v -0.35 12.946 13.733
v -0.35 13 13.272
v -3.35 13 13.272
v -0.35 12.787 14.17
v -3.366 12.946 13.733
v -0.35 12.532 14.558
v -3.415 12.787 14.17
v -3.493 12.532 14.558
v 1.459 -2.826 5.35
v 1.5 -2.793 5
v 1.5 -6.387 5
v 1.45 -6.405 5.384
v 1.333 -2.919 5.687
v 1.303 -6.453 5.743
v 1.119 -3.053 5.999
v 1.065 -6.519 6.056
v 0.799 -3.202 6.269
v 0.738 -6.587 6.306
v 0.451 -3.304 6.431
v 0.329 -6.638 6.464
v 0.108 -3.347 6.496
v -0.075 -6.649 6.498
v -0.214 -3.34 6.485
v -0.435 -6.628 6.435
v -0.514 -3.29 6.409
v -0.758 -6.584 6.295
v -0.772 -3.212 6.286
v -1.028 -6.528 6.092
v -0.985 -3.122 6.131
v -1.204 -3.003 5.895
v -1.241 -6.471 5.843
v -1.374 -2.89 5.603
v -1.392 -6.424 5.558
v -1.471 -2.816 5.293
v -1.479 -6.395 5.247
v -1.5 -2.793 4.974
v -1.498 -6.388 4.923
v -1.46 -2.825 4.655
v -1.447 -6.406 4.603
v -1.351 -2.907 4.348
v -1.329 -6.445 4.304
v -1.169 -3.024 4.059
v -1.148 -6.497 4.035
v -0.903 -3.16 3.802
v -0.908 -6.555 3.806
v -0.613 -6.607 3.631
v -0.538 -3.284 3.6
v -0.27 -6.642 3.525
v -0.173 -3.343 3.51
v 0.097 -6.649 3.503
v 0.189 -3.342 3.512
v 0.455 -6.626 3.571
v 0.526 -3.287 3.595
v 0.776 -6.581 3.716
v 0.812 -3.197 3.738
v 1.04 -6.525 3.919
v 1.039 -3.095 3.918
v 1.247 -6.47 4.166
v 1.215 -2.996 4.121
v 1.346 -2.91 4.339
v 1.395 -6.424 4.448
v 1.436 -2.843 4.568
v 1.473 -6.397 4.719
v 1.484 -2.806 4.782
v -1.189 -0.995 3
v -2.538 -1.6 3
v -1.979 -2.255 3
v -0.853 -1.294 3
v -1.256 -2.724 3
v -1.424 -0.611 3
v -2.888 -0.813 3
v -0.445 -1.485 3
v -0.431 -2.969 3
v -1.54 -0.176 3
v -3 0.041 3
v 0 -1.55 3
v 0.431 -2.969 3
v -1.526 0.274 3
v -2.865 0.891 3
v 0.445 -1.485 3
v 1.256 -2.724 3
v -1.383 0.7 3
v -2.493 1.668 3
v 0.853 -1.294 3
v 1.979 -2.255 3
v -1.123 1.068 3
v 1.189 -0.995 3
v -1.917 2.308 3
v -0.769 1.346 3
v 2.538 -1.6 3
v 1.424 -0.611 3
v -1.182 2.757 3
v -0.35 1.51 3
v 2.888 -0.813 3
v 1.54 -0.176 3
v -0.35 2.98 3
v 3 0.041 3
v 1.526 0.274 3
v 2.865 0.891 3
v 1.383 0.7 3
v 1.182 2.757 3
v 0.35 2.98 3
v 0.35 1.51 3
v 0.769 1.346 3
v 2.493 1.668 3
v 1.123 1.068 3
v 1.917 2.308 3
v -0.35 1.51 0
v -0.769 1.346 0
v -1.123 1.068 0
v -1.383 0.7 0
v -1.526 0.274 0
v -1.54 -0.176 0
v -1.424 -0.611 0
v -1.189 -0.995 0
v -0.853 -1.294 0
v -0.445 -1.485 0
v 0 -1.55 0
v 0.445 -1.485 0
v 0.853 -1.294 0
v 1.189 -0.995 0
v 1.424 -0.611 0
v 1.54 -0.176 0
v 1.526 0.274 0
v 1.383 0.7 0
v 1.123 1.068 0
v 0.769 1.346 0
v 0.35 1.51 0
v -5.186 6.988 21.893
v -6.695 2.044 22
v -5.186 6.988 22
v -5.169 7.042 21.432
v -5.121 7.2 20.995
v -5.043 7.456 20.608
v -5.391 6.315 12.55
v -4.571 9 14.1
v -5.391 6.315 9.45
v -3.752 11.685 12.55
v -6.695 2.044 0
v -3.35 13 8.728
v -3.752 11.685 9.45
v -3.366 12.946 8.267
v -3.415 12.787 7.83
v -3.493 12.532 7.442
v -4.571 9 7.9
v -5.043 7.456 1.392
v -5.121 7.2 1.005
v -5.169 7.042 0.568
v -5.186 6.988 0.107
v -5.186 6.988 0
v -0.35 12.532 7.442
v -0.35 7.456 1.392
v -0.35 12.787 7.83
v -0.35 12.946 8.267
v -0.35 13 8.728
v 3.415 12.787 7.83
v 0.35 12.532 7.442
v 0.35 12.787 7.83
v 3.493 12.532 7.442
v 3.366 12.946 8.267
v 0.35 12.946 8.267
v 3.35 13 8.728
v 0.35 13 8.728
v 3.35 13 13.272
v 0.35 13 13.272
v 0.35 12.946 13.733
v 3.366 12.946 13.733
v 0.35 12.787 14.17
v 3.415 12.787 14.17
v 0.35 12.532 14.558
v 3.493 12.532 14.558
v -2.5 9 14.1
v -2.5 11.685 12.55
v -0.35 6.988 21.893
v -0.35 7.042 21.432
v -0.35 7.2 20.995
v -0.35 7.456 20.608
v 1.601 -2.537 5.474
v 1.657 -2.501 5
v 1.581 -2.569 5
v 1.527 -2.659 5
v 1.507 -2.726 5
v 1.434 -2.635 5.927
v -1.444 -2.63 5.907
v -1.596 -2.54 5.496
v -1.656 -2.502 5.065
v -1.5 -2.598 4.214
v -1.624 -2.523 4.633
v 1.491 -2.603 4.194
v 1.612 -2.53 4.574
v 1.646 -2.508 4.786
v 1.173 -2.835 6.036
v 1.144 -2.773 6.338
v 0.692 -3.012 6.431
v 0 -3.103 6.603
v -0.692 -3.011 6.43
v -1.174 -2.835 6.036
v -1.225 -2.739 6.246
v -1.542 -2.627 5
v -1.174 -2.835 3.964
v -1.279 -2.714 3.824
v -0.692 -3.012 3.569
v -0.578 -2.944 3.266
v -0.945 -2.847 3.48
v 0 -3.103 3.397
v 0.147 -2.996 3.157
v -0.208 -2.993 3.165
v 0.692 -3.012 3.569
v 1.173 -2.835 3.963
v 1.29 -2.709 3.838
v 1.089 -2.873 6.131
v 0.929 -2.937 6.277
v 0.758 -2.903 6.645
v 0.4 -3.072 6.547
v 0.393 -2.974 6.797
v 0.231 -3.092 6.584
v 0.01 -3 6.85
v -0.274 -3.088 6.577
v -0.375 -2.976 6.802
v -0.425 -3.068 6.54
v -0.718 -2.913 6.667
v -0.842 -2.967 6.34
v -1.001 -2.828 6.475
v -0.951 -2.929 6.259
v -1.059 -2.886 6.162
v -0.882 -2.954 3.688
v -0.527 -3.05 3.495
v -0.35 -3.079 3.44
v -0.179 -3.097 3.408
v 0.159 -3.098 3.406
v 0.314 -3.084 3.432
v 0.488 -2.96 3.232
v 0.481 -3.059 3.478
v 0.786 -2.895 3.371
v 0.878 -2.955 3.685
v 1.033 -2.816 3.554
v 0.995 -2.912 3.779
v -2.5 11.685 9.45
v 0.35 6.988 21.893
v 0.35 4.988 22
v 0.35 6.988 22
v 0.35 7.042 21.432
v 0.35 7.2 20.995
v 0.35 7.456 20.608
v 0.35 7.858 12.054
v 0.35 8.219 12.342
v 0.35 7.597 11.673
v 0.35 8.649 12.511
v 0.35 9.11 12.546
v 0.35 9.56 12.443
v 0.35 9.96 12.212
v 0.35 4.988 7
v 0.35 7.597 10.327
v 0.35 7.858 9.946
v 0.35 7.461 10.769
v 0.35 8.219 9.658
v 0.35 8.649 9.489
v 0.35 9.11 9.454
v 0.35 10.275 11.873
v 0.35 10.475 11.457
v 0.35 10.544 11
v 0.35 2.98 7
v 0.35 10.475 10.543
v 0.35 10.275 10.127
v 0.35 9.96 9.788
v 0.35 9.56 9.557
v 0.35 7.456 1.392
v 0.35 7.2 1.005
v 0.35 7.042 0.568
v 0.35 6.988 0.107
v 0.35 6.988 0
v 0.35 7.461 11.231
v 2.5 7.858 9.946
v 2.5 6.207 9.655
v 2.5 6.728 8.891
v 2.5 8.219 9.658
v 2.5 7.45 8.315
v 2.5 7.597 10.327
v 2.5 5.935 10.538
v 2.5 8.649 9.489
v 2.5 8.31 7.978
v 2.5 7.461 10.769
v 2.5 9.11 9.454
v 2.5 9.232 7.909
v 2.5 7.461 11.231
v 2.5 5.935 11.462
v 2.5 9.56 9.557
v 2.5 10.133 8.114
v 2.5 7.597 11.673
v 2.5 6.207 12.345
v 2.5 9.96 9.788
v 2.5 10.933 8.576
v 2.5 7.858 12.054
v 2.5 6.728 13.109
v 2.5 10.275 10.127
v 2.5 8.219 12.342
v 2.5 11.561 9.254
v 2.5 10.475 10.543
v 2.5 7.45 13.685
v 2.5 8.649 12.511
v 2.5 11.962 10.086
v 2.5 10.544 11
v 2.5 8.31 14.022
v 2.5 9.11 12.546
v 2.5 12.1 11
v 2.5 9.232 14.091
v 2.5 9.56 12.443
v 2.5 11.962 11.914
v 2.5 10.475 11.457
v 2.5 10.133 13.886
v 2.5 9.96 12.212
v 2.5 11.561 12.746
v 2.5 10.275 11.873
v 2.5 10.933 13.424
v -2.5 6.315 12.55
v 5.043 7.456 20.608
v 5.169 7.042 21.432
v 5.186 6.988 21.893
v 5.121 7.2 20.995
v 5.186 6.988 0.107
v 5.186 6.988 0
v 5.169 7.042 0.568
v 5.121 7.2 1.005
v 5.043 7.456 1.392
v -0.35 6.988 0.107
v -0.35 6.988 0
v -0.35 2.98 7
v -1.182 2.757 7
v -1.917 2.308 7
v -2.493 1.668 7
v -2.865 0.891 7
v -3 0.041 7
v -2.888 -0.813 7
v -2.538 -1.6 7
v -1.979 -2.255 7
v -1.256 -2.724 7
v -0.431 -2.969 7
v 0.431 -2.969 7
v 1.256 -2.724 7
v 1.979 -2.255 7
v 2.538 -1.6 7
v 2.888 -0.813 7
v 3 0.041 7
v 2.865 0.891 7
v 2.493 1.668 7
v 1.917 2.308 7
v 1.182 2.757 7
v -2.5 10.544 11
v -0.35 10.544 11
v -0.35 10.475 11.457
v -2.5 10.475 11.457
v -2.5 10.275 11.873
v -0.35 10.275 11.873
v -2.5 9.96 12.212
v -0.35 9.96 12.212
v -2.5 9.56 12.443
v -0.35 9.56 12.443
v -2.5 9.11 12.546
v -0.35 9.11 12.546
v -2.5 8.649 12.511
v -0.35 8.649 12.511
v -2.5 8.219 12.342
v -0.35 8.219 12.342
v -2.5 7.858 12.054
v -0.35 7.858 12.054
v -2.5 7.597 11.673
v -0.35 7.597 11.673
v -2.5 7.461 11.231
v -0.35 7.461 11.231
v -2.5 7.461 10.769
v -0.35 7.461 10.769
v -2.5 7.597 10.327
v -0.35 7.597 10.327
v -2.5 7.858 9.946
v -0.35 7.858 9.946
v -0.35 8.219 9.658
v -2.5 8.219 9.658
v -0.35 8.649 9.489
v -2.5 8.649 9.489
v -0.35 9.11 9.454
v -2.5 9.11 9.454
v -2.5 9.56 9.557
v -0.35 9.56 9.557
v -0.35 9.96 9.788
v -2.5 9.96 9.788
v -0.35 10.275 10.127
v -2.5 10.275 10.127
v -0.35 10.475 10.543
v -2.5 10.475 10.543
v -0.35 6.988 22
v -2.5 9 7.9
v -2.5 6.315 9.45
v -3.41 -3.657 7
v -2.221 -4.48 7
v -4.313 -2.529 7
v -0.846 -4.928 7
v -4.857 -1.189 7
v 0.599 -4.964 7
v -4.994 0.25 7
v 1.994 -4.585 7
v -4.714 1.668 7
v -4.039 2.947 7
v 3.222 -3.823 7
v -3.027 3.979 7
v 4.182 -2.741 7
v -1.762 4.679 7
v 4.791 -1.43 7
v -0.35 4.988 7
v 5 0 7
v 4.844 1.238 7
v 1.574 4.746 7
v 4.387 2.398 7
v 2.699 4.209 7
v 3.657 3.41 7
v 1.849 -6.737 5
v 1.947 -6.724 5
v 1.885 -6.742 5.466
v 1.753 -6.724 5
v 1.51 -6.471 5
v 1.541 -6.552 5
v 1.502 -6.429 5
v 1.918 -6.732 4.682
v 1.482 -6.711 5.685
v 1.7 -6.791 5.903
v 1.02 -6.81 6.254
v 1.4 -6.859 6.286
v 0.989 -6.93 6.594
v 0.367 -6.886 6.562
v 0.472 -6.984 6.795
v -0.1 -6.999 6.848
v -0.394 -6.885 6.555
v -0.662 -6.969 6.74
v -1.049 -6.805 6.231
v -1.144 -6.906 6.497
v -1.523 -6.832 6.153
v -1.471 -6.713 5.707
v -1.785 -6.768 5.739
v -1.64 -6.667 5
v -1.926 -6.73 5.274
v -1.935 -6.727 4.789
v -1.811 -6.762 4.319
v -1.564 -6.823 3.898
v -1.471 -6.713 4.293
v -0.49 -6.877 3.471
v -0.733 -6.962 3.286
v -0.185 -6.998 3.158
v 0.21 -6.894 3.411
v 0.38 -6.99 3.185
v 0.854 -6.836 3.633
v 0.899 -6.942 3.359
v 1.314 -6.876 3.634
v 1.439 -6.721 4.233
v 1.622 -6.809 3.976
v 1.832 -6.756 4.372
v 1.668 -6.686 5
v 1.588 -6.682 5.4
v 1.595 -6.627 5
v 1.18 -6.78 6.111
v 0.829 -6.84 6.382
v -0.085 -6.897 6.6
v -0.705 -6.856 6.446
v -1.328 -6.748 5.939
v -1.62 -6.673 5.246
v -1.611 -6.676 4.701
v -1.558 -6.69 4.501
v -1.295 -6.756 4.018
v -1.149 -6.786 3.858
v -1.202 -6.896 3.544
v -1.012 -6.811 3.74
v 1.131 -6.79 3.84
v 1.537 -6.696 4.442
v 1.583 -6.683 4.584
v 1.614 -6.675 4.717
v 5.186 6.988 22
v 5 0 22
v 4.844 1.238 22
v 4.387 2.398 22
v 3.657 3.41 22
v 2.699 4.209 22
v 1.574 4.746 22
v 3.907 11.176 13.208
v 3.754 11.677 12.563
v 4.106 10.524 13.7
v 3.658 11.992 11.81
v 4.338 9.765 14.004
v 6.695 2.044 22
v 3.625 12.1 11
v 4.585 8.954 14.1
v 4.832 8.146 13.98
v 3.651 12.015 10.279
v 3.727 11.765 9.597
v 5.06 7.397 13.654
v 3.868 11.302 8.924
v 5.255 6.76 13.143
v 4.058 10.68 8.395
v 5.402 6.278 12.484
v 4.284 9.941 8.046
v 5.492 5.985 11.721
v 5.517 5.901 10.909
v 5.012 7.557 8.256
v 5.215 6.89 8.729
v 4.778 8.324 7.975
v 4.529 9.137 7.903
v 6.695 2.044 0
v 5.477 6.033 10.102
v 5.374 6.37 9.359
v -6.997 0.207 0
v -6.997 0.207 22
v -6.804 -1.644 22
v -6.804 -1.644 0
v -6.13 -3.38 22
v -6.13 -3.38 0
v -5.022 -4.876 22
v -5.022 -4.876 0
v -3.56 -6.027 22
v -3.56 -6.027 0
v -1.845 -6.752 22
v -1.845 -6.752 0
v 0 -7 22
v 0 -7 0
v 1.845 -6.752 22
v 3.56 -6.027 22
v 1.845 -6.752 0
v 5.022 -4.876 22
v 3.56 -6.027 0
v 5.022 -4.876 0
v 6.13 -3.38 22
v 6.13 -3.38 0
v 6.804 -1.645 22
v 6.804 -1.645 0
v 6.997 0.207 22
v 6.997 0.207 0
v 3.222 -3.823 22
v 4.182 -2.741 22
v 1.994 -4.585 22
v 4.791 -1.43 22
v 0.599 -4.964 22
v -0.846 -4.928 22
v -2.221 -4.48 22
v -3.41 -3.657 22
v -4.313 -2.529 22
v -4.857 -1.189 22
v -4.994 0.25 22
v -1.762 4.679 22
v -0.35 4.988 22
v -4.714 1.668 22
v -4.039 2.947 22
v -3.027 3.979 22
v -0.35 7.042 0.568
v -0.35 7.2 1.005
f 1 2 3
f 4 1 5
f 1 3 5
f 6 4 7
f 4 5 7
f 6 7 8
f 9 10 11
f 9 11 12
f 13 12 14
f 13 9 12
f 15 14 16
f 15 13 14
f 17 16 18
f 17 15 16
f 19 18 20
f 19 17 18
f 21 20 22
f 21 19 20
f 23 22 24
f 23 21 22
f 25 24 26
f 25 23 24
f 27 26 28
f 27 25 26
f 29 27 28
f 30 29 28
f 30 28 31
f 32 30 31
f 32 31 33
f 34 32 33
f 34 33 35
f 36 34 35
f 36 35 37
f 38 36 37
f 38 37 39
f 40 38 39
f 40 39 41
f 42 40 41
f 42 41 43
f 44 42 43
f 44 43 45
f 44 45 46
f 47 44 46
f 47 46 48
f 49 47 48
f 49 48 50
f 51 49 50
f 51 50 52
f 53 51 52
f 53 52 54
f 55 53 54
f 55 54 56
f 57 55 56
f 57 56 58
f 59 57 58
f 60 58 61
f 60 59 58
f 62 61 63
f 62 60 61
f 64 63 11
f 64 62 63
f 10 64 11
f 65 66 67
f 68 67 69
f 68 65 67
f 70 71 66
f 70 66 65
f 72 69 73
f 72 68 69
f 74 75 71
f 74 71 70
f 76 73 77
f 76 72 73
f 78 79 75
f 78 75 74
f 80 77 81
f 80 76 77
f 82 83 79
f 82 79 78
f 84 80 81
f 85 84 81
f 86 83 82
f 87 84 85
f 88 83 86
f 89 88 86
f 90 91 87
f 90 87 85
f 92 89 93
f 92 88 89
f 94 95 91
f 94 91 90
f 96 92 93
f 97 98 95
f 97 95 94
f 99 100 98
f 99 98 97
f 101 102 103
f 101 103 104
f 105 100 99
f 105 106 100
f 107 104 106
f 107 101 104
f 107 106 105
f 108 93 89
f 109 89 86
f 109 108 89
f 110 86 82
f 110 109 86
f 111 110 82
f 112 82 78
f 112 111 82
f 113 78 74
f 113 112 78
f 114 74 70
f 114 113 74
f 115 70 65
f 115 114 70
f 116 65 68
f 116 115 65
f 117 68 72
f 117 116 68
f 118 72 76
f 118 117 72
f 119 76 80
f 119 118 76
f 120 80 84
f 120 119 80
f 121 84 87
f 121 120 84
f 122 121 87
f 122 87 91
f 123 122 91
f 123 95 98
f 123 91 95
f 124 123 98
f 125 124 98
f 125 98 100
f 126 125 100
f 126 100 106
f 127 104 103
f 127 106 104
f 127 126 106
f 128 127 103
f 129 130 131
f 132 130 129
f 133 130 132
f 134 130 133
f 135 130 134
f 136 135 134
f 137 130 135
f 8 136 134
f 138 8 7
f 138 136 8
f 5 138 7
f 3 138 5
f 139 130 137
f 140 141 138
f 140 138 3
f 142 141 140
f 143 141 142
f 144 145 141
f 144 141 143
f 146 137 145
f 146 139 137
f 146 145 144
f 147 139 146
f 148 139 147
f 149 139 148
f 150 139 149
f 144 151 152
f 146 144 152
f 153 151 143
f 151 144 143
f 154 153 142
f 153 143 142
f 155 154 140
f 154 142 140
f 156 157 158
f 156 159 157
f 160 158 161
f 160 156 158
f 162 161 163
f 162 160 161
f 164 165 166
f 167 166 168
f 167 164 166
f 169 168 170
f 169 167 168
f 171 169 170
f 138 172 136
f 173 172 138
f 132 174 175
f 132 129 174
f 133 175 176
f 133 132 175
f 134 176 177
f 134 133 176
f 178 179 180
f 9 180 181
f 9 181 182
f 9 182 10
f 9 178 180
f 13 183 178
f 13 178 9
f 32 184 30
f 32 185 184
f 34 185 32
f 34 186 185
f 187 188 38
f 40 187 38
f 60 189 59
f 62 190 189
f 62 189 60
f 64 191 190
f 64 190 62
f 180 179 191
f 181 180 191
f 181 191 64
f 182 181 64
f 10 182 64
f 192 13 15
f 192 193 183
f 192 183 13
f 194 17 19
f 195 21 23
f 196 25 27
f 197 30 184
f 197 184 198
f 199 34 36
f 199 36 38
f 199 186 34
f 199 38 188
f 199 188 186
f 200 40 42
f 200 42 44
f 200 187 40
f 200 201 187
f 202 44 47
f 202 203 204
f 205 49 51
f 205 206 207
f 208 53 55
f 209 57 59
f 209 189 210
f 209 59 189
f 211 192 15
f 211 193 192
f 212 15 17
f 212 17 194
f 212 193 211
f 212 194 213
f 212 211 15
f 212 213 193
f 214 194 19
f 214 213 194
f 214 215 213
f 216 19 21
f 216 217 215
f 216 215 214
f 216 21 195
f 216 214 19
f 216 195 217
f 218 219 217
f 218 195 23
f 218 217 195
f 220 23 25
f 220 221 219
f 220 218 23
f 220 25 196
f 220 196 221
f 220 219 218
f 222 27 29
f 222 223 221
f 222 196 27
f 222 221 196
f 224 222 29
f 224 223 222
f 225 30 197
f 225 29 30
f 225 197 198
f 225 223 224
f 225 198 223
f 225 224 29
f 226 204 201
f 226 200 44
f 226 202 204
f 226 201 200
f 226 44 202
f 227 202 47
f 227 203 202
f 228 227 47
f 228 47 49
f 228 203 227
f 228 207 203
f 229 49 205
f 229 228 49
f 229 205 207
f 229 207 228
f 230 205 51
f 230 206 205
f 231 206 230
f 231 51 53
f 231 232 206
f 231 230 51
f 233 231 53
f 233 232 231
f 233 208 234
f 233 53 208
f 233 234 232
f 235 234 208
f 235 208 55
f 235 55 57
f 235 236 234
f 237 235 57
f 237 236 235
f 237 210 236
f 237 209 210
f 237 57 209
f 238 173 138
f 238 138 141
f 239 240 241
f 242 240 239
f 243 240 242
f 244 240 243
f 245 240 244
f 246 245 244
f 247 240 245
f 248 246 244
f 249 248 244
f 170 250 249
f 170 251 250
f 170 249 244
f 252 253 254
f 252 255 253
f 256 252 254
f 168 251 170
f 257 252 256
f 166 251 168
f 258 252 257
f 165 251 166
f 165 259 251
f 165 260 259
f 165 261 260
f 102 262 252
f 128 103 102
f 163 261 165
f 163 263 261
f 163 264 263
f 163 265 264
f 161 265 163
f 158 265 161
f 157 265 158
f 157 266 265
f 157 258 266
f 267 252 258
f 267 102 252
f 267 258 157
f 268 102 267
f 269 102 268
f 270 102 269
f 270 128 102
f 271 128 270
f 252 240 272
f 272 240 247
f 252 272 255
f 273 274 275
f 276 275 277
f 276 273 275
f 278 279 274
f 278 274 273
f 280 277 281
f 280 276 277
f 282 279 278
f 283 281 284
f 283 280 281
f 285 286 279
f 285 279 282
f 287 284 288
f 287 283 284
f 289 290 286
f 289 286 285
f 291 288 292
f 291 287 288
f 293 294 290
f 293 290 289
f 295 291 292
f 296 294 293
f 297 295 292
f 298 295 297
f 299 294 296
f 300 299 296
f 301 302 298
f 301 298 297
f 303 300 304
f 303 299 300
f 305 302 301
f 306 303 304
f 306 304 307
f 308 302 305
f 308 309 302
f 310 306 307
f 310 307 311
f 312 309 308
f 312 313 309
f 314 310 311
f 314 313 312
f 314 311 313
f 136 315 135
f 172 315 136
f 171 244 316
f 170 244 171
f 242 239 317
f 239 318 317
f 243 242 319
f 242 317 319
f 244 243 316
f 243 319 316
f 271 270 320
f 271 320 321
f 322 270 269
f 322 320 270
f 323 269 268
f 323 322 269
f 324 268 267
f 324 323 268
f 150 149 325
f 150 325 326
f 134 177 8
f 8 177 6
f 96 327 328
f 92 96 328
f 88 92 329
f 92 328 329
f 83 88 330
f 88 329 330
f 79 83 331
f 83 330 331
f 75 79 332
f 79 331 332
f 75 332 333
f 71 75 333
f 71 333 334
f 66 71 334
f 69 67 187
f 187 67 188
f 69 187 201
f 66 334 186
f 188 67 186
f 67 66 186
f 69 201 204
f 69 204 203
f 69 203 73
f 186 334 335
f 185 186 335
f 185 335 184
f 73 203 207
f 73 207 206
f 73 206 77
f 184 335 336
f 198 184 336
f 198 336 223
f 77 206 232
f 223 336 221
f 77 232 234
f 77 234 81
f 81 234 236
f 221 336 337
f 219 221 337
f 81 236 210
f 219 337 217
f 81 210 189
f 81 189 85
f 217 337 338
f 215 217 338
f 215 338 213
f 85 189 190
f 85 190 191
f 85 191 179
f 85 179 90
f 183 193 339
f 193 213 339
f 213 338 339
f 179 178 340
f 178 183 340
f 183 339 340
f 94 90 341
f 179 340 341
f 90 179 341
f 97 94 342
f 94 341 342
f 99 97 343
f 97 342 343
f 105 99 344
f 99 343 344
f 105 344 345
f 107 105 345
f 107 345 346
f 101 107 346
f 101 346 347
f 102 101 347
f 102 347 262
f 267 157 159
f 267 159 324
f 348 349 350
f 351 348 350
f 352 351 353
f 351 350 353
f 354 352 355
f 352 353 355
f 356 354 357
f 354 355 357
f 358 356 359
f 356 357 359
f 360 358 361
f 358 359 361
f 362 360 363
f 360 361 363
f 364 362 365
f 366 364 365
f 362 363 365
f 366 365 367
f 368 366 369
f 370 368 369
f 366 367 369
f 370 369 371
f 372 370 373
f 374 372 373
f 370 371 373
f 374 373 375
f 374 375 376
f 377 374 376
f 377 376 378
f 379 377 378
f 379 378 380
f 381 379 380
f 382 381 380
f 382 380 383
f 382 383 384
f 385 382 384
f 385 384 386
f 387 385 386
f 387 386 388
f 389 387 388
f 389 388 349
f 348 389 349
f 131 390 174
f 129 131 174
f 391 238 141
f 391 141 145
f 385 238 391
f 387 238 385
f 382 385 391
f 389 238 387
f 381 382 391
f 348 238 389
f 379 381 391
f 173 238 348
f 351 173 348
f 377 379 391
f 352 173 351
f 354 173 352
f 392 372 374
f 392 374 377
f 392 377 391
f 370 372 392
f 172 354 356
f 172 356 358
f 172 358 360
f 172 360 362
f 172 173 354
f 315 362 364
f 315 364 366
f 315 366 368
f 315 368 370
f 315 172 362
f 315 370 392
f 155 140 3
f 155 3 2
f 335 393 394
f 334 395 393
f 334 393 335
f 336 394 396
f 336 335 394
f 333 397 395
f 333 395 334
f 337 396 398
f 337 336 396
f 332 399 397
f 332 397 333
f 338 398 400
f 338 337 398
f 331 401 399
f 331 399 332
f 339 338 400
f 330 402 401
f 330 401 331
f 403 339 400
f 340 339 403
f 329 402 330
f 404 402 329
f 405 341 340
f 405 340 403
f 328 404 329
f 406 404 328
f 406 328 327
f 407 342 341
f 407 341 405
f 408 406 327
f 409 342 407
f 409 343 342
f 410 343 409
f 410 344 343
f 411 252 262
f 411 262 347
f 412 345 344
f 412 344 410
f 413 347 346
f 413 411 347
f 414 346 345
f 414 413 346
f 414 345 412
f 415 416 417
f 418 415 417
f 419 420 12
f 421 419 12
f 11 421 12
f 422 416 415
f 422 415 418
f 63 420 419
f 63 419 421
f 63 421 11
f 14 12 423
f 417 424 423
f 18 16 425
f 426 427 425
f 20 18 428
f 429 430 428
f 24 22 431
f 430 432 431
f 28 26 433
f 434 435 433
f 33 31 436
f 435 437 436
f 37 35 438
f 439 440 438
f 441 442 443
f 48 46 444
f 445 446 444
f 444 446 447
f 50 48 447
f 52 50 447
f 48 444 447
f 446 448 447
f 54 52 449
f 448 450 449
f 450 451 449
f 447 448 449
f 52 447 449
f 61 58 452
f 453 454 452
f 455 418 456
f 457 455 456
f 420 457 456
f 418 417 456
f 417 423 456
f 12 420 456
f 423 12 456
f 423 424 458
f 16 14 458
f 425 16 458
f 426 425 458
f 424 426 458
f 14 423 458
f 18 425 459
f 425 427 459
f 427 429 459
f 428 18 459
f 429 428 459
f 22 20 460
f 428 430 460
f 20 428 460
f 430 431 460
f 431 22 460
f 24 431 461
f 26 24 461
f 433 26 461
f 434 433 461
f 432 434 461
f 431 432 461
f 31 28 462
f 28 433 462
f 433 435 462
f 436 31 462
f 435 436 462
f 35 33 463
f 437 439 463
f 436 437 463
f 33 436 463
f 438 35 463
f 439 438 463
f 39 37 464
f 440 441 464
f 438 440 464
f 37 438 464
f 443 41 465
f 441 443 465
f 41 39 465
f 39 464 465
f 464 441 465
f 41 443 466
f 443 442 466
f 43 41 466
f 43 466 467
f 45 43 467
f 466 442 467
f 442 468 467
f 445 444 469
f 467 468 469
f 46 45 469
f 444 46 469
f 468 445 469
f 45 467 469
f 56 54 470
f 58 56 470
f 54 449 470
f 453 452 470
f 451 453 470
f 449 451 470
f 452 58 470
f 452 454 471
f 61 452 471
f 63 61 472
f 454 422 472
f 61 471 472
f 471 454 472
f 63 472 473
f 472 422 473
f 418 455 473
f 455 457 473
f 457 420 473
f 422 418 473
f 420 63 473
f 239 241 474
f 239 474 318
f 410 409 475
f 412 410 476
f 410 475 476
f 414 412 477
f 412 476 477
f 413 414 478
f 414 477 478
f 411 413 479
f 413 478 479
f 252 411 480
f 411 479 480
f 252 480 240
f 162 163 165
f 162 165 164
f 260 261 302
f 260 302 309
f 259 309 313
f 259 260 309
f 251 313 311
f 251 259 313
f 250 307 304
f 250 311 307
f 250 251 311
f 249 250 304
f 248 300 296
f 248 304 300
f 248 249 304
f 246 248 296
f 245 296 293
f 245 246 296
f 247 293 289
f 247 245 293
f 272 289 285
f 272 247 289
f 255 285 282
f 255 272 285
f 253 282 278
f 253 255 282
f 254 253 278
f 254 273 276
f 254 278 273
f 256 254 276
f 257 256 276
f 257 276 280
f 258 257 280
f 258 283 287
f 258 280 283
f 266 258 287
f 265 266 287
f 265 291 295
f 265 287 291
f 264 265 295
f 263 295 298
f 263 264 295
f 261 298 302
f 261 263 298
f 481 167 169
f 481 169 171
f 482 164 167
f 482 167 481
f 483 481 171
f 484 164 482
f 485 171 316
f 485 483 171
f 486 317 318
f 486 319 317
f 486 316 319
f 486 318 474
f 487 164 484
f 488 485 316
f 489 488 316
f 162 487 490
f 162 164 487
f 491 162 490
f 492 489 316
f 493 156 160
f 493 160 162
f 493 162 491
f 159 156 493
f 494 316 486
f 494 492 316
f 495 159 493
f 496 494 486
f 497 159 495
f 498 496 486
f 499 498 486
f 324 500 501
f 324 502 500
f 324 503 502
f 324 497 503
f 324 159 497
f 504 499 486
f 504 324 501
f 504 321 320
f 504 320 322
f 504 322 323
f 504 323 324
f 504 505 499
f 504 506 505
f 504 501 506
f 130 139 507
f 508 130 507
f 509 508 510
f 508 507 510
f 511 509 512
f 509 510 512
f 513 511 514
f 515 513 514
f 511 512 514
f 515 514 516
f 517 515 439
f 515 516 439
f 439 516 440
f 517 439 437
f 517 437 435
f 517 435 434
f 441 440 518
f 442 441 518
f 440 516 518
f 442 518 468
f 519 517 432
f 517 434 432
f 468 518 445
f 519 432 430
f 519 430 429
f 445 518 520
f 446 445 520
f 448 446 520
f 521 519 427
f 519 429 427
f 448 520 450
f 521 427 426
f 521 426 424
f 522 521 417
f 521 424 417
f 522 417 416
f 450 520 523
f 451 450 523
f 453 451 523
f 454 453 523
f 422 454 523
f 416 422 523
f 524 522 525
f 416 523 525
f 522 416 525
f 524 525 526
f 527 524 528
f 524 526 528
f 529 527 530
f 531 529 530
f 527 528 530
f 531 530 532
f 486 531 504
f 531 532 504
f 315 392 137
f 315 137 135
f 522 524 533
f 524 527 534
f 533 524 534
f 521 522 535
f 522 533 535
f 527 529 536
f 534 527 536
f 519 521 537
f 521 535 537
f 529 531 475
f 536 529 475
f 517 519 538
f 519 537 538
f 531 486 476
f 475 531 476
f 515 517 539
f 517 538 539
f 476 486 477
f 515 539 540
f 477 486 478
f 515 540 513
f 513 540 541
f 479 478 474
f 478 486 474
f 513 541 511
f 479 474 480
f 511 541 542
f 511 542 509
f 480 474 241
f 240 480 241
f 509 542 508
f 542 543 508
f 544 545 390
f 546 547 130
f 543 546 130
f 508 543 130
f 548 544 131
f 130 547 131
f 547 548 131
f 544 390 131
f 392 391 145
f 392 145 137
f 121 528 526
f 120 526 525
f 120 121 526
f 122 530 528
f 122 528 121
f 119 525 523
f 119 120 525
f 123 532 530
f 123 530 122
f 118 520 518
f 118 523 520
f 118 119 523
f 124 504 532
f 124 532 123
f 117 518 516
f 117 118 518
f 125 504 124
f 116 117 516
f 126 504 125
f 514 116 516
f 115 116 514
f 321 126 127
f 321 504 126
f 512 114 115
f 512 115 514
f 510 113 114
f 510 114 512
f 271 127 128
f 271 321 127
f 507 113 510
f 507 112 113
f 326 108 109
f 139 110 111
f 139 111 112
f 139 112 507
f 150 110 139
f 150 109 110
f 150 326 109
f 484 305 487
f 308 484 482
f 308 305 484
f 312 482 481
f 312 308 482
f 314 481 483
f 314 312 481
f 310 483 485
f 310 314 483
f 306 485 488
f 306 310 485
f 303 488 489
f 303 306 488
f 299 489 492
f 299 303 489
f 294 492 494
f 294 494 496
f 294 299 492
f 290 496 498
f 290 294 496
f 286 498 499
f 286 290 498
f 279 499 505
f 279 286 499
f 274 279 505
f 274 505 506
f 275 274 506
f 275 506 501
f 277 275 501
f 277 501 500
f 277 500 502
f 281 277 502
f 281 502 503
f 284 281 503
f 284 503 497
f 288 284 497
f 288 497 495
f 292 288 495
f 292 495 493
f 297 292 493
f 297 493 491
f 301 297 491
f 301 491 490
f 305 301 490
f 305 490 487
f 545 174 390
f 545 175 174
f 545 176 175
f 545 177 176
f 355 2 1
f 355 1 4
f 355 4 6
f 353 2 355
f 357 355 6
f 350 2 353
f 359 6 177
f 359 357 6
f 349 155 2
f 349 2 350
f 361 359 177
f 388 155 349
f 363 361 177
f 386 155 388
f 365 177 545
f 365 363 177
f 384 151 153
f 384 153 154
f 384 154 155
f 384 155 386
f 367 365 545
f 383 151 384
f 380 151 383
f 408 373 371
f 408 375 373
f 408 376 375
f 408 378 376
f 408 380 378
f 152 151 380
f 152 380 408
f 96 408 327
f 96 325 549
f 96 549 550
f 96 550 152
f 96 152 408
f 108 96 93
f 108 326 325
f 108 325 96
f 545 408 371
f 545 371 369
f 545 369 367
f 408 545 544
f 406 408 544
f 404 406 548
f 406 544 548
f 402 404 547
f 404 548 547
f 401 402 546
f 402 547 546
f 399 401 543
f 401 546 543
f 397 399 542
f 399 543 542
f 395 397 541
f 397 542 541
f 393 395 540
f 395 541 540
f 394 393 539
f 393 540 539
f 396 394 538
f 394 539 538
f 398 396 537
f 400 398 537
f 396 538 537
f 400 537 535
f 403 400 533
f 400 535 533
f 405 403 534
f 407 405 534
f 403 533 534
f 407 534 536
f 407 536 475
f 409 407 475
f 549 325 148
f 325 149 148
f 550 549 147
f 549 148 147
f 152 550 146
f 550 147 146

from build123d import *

# Parameters (mm, degrees)
EXTRUDE003_DEPTH                     = 10
SKETCH005_R                          = 3.1
EXTRUDE002_DEPTH                     = 10
SKETCH003_AS_DRAWN_R                 = 1.5
EXTRUDE001_DEPTH                     = 10
EXTRUDE001_ONTO_SKETCH003_ROLL_ANGLE = 90
EXTRUDE_DEPTH                        = 22
SKETCH001_R                          = 5
POCKET_DEPTH                         = 15
SKETCH002_R                          = 3
POCKET001_DEPTH                      = 4
FILLET_R                             = 0.35
SKETCH004_R                          = 1.55
POCKET002_DEPTH                      = 6.651
POCKET002_DEPTH_BACK                 = -7.351
FILLET001_R                          = 2


with BuildPart() as extrude003:
    # Sketch006 → Extrude003 (new body)
    with BuildSketch(Plane(origin=(-2.5, 0, 0), x_dir=(0, -1, 0), z_dir=(-1, 0, 0))):
        Polygon((-9, 14.1), (-11.684679, 12.55), (-11.684679, 9.45), (-9, 7.9), (-6.315321, 9.45), (-6.315321, 12.55), align=None)
    extrude(amount=EXTRUDE003_DEPTH)


with BuildPart() as extrude002:
    # Sketch005 → Extrude002 (new body)
    with BuildSketch(Plane.YZ.offset(2.5)):
        with Locations((9, 11)):
            Circle(SKETCH005_R)
    extrude(amount=EXTRUDE002_DEPTH)


with BuildPart() as extrude001:
    # Sketch003 as drawn → Extrude001 (new)
    with BuildSketch(Plane.XY):
        with Locations((0, 5)):
            Circle(SKETCH003_AS_DRAWN_R)
    extrude(amount=EXTRUDE001_DEPTH)


with BuildPart() as extrude001_1:
    # Extrude001 onto Sketch003 roll: moved
    add(extrude001.part.rotate(Axis((0, 0, 0), (1, 0, 0)), EXTRUDE001_ONTO_SKETCH003_ROLL_ANGLE))


with BuildPart() as extrude001_2:
    # Extrude001 onto Sketch003 placement: moved
    add(extrude001_1.part)


with BuildPart() as fillet001:
    # Sketch → Extrude (new body)
    with BuildSketch(Plane.XY):
        with BuildLine():
            ThreePointArc((-0.35, 1.509967), (0, -1.55), (0.35, 1.509967))
            Line((0.35, 1.509967), (0.35, 13))
            Line((0.35, 13), (3.35, 13))
            Line((3.35, 13), (6.694934, 2.043982))
            ThreePointArc((-6.694921, 2.044024), (-2.2e-05, -7), (6.694934, 2.043982))
            Line((-6.694921, 2.044024), (-3.35, 13))
            Line((-3.35, 13), (-0.35, 13))
            Line((-0.35, 13), (-0.35, 1.509967))
        make_face()
    extrude(amount=EXTRUDE_DEPTH)

    # Sketch001 → Pocket (cut)
    with BuildSketch(Plane.XY.offset(22)):
        Circle(SKETCH001_R)
    extrude(amount=-POCKET_DEPTH, mode=Mode.SUBTRACT)

    # Sketch002 → Pocket001 (cut)
    with BuildSketch(Plane.XY.offset(7)):
        Circle(SKETCH002_R)
    extrude(amount=-POCKET001_DEPTH, mode=Mode.SUBTRACT)

    # Cut: cut Extrude001
    add(extrude001_2.part, mode=Mode.SUBTRACT)

    # Fillet
    fillet_edges = [fillet001.edges().sort_by_distance(p)[0] for p in [
        (-1.5, -6.837397, 5),
        (-1.5, -2.598076, 5),
    ]]
    fillet(fillet_edges, radius=FILLET_R)

    # Sketch004 → Pocket002 (cut, two sides)
    with BuildSketch(Plane.YZ.offset(-0.35)) as pocket002_sk:
        with Locations((8.993867, 11)):
            Circle(SKETCH004_R)
        Polygon((6.987735, 22), (6.987735, 21.165138), (13, 14), (13, 22), align=None)
        Polygon((13, 8), (6.987735, 0.834862), (6.987735, 0), (13, 0), align=None)
    extrude(amount=-POCKET002_DEPTH, mode=Mode.SUBTRACT)
    extrude(pocket002_sk.sketch, amount=-POCKET002_DEPTH_BACK, mode=Mode.SUBTRACT)

    # Cut001: cut Extrude002
    add(extrude002.part, mode=Mode.SUBTRACT)

    # Cut003: cut Extrude003
    add(extrude003.part, mode=Mode.SUBTRACT)

    # Fillet001
    fillet001_edges = [fillet001.edges().sort_by_distance(p)[0] for p in [
        (-2.767789, 6.987735, 0.834862),
        (-1.85, 13, 8),
        (-2.767789, 6.987735, 21.165138),
        (-1.85, 13, 14),
        (2.767789, 6.987735, 0.834862),
        (2.767789, 6.987735, 21.165138),
        (1.85, 13, 8),
        (1.85, 13, 14),
    ]]
    fillet(fillet001_edges, radius=FILLET001_R)


solid = fillet001.part
